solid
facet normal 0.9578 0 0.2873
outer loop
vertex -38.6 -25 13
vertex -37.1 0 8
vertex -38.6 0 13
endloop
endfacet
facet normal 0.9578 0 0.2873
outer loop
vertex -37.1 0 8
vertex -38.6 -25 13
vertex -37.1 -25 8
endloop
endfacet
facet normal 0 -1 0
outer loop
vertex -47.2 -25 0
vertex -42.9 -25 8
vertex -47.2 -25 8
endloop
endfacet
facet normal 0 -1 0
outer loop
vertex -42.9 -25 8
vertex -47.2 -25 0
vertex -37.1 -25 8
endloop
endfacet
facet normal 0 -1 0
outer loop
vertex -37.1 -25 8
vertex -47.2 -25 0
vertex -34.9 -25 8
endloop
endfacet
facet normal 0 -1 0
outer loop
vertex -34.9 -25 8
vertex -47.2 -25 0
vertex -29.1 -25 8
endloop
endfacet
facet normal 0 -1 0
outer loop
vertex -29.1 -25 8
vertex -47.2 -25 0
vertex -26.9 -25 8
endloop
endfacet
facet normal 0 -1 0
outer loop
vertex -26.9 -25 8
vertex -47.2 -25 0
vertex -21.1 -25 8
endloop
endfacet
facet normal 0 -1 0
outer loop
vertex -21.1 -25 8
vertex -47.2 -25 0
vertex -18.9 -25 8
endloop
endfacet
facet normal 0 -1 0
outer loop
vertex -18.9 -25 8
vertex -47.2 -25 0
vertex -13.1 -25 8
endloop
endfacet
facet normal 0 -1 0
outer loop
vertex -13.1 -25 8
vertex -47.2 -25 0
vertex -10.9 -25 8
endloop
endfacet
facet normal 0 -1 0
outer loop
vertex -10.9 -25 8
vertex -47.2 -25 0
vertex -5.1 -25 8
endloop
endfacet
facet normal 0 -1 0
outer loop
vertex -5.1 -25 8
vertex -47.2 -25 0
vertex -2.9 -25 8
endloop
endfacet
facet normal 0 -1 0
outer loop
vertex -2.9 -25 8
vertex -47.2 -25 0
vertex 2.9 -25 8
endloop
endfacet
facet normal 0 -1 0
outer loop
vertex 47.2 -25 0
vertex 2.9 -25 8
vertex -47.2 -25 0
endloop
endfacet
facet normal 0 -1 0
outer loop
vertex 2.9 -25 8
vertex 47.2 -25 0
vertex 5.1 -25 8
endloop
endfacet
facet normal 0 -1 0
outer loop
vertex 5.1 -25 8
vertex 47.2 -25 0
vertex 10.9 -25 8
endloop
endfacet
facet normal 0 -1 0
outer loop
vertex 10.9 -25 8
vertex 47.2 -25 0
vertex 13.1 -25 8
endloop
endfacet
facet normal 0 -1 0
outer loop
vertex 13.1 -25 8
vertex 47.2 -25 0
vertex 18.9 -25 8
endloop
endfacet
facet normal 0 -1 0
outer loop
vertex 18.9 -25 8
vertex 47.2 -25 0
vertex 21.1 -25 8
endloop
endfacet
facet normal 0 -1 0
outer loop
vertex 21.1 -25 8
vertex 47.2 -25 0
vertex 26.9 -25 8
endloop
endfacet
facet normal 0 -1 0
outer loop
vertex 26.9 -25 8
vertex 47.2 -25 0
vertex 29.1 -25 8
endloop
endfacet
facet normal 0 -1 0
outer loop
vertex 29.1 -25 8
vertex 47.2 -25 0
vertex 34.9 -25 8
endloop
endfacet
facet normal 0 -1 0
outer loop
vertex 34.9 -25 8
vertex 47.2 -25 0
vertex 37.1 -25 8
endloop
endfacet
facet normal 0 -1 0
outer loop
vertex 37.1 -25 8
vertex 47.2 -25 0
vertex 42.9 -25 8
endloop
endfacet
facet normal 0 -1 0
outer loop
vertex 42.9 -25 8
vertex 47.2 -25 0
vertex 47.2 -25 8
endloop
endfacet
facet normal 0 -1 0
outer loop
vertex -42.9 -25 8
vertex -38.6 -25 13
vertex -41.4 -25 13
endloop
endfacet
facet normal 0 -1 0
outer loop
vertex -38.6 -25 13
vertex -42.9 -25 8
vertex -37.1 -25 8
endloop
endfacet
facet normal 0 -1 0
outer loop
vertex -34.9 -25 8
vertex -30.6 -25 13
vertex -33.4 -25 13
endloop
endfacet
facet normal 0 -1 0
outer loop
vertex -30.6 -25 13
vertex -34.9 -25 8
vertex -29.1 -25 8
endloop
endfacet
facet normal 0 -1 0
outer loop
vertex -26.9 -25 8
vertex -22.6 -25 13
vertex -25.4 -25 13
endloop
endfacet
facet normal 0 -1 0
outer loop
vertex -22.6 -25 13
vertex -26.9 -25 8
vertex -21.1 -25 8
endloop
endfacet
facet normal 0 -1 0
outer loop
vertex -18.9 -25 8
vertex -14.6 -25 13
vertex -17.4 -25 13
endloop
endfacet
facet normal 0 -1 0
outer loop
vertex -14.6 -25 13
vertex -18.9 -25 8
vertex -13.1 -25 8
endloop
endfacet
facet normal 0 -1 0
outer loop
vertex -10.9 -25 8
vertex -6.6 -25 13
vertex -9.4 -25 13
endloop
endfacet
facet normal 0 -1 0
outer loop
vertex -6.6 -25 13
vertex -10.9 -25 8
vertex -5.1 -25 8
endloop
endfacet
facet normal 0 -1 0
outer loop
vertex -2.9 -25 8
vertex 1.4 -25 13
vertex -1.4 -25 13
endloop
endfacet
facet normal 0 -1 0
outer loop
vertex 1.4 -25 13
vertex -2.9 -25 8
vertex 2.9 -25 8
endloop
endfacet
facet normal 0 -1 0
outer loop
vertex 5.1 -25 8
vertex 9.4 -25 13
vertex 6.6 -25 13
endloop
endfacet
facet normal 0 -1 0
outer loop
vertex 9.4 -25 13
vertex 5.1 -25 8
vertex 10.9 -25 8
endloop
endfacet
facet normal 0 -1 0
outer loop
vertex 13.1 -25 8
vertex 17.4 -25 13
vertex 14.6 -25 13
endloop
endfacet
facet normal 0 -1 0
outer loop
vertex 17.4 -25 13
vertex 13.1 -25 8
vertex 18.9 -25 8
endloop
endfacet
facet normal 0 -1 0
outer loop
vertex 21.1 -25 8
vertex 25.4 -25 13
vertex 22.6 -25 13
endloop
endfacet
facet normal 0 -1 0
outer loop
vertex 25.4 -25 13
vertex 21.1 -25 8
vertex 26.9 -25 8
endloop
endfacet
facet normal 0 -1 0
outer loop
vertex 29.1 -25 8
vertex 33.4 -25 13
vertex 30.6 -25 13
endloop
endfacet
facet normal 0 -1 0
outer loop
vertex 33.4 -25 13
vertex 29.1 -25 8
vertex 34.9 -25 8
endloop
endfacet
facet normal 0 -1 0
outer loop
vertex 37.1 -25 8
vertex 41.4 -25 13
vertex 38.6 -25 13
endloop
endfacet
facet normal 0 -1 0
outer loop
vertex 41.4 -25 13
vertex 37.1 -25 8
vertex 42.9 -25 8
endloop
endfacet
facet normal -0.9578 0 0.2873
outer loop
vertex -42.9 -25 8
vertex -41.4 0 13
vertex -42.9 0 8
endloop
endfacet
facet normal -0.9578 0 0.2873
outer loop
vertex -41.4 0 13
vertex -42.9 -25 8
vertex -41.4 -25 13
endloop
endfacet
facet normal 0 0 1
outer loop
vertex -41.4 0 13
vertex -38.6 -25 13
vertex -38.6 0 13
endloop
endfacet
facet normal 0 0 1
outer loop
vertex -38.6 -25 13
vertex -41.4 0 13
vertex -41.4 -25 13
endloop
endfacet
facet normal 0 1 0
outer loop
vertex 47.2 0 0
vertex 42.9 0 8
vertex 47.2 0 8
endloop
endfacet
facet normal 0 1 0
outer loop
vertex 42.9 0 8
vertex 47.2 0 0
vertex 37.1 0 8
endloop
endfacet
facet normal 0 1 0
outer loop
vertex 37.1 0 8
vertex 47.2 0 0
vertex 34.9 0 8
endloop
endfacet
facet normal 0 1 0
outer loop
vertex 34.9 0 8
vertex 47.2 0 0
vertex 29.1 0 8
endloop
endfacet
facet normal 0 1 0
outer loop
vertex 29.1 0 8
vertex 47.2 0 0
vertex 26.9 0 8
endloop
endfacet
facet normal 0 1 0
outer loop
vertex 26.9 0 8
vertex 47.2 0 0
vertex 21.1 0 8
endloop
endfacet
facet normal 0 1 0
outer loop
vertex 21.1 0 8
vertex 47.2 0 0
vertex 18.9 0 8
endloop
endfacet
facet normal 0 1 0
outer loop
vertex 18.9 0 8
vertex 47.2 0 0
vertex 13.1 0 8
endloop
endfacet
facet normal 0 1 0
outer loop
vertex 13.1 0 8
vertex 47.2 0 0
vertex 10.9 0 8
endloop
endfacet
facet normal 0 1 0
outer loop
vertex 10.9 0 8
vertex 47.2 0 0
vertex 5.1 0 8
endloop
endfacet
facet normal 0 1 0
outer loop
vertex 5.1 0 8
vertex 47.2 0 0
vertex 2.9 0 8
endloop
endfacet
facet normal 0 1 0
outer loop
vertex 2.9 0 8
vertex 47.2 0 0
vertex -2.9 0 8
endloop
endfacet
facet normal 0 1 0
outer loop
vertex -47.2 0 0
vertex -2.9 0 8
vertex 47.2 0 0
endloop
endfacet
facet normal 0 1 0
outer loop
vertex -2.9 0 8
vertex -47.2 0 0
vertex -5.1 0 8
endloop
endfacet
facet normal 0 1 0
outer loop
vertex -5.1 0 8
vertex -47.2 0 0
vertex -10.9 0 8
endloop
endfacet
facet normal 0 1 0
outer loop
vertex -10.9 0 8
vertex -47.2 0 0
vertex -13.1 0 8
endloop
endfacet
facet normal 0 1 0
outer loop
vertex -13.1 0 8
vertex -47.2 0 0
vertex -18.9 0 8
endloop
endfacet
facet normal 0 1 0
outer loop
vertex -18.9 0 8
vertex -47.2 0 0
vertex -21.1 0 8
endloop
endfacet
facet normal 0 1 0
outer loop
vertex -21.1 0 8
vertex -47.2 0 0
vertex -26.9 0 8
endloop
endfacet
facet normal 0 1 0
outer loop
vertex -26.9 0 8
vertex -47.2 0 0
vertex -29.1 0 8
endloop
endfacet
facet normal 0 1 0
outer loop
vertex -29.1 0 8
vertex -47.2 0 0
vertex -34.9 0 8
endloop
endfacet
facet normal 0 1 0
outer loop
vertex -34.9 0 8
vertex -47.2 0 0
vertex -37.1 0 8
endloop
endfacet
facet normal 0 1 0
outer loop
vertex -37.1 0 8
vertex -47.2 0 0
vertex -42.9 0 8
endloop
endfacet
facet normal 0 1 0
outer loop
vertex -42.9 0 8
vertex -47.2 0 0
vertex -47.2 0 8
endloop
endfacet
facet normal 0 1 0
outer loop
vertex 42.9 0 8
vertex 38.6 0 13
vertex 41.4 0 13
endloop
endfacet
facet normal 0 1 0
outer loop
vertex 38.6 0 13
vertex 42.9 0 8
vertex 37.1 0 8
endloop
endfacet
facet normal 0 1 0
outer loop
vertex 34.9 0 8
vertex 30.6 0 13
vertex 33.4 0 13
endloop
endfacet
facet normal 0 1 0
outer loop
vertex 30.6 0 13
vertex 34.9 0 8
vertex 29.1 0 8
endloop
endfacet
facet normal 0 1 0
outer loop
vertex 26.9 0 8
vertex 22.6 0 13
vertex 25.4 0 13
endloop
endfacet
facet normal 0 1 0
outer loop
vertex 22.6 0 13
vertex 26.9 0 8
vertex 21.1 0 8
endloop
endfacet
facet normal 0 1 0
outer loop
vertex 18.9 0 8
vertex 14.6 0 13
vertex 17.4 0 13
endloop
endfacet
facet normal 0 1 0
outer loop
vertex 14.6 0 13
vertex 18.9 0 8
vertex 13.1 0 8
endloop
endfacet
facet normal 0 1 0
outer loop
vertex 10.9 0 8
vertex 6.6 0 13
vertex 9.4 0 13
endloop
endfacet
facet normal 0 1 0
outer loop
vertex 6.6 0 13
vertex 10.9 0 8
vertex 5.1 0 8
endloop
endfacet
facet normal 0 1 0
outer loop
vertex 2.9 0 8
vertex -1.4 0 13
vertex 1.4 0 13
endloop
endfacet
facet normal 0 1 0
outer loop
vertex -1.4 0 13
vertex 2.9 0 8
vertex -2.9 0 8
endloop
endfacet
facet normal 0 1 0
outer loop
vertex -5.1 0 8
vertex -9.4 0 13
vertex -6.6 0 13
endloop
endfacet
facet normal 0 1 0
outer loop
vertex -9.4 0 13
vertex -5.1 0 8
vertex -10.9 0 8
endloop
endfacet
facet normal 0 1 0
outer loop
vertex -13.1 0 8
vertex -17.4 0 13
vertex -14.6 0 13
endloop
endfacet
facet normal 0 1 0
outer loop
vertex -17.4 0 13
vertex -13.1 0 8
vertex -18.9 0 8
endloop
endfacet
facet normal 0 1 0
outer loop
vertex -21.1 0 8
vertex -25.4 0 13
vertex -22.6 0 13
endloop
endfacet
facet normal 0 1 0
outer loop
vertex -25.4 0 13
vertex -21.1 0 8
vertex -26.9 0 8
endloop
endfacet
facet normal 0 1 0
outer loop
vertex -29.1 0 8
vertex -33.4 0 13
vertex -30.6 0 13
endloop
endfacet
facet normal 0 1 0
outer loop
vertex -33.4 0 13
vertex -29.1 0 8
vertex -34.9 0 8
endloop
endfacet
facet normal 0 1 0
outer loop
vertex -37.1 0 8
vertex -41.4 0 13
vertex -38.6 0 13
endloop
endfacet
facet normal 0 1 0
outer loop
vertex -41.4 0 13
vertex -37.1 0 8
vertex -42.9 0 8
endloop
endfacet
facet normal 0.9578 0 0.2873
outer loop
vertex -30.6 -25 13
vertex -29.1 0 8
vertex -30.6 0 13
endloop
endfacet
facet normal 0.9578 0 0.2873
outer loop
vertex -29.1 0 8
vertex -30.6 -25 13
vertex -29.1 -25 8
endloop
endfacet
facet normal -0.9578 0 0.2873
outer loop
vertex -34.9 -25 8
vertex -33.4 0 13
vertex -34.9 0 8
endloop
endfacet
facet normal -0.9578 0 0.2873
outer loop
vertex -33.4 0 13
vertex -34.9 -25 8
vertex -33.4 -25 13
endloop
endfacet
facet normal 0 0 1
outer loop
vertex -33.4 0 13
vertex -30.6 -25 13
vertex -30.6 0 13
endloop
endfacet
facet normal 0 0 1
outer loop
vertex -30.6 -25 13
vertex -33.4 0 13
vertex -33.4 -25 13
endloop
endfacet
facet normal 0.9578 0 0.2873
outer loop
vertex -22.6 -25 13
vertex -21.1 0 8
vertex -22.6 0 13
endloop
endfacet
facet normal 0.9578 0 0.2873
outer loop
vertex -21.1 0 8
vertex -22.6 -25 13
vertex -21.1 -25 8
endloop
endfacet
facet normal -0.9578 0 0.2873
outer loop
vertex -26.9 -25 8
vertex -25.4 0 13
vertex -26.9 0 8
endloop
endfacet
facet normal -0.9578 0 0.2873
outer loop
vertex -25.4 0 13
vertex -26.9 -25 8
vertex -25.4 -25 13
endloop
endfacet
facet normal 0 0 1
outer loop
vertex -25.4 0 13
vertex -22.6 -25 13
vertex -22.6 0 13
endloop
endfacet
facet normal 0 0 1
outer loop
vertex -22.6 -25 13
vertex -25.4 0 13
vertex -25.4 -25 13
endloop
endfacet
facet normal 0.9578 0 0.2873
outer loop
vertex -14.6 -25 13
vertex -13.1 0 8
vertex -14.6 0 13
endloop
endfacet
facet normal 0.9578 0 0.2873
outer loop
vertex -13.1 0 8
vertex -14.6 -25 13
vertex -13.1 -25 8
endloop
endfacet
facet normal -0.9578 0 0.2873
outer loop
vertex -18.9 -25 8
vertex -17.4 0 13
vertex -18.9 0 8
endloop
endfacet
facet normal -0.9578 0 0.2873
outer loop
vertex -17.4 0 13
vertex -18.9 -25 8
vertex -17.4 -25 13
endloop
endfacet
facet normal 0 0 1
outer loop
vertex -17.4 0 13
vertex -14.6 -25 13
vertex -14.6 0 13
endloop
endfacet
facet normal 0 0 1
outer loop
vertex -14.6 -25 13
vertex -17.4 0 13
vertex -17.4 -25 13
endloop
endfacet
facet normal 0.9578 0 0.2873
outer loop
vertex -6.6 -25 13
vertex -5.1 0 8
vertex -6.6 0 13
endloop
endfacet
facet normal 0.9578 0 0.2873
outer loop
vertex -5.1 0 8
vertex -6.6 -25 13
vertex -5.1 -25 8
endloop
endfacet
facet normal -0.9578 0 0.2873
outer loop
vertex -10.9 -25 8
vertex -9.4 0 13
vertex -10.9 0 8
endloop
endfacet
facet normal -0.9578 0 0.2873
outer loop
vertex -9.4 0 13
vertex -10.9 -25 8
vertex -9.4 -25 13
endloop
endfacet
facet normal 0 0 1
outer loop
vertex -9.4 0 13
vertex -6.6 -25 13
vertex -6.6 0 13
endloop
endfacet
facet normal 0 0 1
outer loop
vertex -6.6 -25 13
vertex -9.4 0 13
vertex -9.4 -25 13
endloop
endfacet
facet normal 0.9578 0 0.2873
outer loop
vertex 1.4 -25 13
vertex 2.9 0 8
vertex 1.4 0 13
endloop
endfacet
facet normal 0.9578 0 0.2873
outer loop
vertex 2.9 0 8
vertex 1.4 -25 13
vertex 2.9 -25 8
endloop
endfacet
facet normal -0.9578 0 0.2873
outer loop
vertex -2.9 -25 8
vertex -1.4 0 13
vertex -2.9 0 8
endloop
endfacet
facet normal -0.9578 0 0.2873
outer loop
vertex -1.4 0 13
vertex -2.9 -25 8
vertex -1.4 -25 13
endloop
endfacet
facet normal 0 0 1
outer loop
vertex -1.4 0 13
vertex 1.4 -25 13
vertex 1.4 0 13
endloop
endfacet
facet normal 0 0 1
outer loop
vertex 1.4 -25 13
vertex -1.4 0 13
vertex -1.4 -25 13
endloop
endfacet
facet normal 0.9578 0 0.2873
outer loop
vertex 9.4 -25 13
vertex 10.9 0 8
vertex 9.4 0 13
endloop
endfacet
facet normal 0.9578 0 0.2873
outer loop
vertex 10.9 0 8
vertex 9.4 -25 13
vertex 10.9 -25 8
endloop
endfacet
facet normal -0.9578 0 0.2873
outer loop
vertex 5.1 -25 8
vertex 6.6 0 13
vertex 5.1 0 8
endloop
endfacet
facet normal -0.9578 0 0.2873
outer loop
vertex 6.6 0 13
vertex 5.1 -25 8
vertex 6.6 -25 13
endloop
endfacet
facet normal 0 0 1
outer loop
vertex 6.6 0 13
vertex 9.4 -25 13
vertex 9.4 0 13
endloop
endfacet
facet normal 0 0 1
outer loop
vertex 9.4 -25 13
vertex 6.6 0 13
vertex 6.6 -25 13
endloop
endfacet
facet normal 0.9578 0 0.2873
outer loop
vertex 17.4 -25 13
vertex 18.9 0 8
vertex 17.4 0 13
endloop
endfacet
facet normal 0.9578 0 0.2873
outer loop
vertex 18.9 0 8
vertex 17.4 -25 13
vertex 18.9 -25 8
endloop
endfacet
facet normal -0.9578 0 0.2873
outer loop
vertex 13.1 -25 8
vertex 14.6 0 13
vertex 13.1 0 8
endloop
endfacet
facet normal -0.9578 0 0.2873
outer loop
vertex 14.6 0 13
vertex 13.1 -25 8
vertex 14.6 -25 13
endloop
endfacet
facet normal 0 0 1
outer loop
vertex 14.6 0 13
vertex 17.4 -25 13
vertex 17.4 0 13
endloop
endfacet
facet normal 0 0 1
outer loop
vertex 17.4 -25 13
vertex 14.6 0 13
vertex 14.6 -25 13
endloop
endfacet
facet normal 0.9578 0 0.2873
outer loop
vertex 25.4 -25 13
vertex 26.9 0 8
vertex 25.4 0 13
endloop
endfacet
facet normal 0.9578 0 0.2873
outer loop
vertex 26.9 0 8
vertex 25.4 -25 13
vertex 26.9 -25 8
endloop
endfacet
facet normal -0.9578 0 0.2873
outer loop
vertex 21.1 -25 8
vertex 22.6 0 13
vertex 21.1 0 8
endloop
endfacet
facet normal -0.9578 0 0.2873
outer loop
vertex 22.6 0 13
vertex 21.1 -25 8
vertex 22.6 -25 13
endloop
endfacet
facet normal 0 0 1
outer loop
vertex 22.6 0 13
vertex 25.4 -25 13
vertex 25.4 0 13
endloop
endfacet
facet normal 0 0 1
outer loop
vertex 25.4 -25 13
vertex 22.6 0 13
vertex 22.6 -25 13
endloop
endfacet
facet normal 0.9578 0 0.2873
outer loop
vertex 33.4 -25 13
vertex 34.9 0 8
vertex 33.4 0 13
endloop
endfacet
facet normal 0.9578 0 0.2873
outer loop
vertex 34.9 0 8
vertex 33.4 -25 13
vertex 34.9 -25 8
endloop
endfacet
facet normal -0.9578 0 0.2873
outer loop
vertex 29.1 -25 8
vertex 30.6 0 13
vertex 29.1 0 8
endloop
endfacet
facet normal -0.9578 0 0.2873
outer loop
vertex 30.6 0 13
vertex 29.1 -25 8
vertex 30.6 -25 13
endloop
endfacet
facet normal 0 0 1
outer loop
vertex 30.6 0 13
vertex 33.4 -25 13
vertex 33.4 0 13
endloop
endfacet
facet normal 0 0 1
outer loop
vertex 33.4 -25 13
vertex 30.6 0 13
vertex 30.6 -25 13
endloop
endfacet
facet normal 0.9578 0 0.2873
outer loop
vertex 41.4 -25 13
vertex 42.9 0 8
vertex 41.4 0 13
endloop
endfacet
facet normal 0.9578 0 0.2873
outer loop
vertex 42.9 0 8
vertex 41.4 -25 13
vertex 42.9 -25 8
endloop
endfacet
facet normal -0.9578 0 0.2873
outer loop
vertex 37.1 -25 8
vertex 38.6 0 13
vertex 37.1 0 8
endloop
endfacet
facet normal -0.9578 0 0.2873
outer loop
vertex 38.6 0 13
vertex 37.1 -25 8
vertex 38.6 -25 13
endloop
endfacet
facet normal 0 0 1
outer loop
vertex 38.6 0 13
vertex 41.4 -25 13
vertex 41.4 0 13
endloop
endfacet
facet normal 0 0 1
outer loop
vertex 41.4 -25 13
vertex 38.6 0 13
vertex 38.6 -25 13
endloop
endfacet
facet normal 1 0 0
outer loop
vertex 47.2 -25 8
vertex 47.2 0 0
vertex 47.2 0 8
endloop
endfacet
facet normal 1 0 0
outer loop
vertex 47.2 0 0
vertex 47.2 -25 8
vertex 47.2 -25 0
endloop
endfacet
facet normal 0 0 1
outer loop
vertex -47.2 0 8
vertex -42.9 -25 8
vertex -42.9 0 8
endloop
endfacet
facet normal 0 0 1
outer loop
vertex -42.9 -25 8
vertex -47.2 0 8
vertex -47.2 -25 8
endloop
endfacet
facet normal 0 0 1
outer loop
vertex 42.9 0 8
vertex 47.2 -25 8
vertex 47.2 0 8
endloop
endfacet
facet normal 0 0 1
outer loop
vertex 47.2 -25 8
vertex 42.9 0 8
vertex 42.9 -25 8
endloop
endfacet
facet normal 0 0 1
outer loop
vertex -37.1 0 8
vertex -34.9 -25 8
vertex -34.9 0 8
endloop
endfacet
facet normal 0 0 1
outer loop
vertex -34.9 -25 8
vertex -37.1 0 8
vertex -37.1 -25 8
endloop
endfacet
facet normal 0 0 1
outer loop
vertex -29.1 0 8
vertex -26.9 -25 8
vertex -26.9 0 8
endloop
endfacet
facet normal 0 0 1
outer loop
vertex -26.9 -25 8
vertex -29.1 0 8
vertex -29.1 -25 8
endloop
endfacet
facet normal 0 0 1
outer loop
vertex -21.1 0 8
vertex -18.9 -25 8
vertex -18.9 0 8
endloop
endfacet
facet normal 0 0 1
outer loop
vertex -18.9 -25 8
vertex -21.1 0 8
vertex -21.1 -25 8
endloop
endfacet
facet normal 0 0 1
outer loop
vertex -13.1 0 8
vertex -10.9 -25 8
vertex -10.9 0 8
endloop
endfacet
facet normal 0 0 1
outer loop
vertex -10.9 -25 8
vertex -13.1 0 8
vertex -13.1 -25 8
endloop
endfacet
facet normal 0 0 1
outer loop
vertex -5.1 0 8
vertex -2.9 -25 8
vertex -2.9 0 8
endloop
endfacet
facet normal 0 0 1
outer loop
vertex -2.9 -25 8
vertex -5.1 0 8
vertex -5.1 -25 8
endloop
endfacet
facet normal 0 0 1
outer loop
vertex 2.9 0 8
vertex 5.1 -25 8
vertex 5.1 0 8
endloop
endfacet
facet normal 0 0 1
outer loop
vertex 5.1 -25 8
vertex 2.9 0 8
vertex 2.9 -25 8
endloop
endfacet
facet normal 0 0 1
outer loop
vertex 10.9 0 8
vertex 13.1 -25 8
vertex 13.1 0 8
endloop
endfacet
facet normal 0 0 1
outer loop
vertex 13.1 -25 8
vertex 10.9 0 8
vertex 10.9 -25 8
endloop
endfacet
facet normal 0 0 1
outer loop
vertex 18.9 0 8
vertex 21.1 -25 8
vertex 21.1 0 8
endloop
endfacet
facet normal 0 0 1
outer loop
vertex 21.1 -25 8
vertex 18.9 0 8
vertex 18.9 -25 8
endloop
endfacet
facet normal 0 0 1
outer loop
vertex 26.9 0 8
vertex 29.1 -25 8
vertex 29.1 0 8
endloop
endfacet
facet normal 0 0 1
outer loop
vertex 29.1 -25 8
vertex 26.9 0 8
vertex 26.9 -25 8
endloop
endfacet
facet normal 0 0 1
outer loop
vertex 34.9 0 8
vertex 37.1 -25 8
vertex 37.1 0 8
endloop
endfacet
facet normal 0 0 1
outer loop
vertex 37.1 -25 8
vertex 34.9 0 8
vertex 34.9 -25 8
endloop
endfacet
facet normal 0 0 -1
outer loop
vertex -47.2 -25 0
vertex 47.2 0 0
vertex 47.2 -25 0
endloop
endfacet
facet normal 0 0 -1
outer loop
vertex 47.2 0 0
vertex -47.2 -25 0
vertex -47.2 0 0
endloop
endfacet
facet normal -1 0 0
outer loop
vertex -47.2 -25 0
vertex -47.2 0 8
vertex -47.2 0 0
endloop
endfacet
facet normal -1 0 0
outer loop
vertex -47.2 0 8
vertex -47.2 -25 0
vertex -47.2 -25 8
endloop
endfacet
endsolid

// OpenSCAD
$fn = 32;

// ----------------------------------------------------------------------
// Toothed rack, 11 teeth
// 8 mm pitch, 5 mm teeth
// ----------------------------------------------------------------------

// --- parameters (mm) ---
bar_w = 25;     // bar width (Y)
bar_h = 8;      // bar height (Z)
teeth = 11;     // number of teeth
pitch = 8;      // tooth pitch
tooth_h = 5;    // tooth height above the bar
root_w = 6.4;   // tooth width at the root
crest_w = 2.8;  // tooth width at the crest

// --- derived feature positions (mm) ---
span = (teeth - 1) * pitch;  // = 80   distance between the outer teeth
bar_l = span + root_w + 8;   // = 94.4   bar length: teeth plus 4 mm at each end
tooth_x = -span / 2;         // = -40   X of the first tooth
height = bar_h + tooth_h;    // = 13   overall height
feature_centers = [
  [tooth_x + 0 * pitch, -bar_w / 2],
  [tooth_x + 1 * pitch, -bar_w / 2],
  [tooth_x + 2 * pitch, -bar_w / 2],
  [tooth_x + 3 * pitch, -bar_w / 2],
  [tooth_x + 4 * pitch, -bar_w / 2],
  [tooth_x + 5 * pitch, -bar_w / 2],
  [tooth_x + 6 * pitch, -bar_w / 2],
  [tooth_x + 7 * pitch, -bar_w / 2],
  [tooth_x + 8 * pitch, -bar_w / 2],
  [tooth_x + 9 * pitch, -bar_w / 2],
  [tooth_x + 10 * pitch, -bar_w / 2]
];   // tooth centre line, drives the tooth loop

// bar with a rack of teeth, one extruded trapezoium per centre
module rack_tooth() {
  linear_extrude(height = bar_w)
    polygon(points = [
      [0, 0],
      [root_w, 0],
      [root_w / 2 + crest_w / 2, tooth_h + 1],
      [root_w / 2 - crest_w / 2, tooth_h + 1]
    ]);
}

union() {
  translate([-bar_l / 2, -bar_w, 0]) cube([bar_l, bar_w, bar_h]);
  for (centre = feature_centers)
    translate([centre[0] - root_w / 2, 0, bar_h - 1]) rotate([90, 0, 0]) rack_tooth();
}
